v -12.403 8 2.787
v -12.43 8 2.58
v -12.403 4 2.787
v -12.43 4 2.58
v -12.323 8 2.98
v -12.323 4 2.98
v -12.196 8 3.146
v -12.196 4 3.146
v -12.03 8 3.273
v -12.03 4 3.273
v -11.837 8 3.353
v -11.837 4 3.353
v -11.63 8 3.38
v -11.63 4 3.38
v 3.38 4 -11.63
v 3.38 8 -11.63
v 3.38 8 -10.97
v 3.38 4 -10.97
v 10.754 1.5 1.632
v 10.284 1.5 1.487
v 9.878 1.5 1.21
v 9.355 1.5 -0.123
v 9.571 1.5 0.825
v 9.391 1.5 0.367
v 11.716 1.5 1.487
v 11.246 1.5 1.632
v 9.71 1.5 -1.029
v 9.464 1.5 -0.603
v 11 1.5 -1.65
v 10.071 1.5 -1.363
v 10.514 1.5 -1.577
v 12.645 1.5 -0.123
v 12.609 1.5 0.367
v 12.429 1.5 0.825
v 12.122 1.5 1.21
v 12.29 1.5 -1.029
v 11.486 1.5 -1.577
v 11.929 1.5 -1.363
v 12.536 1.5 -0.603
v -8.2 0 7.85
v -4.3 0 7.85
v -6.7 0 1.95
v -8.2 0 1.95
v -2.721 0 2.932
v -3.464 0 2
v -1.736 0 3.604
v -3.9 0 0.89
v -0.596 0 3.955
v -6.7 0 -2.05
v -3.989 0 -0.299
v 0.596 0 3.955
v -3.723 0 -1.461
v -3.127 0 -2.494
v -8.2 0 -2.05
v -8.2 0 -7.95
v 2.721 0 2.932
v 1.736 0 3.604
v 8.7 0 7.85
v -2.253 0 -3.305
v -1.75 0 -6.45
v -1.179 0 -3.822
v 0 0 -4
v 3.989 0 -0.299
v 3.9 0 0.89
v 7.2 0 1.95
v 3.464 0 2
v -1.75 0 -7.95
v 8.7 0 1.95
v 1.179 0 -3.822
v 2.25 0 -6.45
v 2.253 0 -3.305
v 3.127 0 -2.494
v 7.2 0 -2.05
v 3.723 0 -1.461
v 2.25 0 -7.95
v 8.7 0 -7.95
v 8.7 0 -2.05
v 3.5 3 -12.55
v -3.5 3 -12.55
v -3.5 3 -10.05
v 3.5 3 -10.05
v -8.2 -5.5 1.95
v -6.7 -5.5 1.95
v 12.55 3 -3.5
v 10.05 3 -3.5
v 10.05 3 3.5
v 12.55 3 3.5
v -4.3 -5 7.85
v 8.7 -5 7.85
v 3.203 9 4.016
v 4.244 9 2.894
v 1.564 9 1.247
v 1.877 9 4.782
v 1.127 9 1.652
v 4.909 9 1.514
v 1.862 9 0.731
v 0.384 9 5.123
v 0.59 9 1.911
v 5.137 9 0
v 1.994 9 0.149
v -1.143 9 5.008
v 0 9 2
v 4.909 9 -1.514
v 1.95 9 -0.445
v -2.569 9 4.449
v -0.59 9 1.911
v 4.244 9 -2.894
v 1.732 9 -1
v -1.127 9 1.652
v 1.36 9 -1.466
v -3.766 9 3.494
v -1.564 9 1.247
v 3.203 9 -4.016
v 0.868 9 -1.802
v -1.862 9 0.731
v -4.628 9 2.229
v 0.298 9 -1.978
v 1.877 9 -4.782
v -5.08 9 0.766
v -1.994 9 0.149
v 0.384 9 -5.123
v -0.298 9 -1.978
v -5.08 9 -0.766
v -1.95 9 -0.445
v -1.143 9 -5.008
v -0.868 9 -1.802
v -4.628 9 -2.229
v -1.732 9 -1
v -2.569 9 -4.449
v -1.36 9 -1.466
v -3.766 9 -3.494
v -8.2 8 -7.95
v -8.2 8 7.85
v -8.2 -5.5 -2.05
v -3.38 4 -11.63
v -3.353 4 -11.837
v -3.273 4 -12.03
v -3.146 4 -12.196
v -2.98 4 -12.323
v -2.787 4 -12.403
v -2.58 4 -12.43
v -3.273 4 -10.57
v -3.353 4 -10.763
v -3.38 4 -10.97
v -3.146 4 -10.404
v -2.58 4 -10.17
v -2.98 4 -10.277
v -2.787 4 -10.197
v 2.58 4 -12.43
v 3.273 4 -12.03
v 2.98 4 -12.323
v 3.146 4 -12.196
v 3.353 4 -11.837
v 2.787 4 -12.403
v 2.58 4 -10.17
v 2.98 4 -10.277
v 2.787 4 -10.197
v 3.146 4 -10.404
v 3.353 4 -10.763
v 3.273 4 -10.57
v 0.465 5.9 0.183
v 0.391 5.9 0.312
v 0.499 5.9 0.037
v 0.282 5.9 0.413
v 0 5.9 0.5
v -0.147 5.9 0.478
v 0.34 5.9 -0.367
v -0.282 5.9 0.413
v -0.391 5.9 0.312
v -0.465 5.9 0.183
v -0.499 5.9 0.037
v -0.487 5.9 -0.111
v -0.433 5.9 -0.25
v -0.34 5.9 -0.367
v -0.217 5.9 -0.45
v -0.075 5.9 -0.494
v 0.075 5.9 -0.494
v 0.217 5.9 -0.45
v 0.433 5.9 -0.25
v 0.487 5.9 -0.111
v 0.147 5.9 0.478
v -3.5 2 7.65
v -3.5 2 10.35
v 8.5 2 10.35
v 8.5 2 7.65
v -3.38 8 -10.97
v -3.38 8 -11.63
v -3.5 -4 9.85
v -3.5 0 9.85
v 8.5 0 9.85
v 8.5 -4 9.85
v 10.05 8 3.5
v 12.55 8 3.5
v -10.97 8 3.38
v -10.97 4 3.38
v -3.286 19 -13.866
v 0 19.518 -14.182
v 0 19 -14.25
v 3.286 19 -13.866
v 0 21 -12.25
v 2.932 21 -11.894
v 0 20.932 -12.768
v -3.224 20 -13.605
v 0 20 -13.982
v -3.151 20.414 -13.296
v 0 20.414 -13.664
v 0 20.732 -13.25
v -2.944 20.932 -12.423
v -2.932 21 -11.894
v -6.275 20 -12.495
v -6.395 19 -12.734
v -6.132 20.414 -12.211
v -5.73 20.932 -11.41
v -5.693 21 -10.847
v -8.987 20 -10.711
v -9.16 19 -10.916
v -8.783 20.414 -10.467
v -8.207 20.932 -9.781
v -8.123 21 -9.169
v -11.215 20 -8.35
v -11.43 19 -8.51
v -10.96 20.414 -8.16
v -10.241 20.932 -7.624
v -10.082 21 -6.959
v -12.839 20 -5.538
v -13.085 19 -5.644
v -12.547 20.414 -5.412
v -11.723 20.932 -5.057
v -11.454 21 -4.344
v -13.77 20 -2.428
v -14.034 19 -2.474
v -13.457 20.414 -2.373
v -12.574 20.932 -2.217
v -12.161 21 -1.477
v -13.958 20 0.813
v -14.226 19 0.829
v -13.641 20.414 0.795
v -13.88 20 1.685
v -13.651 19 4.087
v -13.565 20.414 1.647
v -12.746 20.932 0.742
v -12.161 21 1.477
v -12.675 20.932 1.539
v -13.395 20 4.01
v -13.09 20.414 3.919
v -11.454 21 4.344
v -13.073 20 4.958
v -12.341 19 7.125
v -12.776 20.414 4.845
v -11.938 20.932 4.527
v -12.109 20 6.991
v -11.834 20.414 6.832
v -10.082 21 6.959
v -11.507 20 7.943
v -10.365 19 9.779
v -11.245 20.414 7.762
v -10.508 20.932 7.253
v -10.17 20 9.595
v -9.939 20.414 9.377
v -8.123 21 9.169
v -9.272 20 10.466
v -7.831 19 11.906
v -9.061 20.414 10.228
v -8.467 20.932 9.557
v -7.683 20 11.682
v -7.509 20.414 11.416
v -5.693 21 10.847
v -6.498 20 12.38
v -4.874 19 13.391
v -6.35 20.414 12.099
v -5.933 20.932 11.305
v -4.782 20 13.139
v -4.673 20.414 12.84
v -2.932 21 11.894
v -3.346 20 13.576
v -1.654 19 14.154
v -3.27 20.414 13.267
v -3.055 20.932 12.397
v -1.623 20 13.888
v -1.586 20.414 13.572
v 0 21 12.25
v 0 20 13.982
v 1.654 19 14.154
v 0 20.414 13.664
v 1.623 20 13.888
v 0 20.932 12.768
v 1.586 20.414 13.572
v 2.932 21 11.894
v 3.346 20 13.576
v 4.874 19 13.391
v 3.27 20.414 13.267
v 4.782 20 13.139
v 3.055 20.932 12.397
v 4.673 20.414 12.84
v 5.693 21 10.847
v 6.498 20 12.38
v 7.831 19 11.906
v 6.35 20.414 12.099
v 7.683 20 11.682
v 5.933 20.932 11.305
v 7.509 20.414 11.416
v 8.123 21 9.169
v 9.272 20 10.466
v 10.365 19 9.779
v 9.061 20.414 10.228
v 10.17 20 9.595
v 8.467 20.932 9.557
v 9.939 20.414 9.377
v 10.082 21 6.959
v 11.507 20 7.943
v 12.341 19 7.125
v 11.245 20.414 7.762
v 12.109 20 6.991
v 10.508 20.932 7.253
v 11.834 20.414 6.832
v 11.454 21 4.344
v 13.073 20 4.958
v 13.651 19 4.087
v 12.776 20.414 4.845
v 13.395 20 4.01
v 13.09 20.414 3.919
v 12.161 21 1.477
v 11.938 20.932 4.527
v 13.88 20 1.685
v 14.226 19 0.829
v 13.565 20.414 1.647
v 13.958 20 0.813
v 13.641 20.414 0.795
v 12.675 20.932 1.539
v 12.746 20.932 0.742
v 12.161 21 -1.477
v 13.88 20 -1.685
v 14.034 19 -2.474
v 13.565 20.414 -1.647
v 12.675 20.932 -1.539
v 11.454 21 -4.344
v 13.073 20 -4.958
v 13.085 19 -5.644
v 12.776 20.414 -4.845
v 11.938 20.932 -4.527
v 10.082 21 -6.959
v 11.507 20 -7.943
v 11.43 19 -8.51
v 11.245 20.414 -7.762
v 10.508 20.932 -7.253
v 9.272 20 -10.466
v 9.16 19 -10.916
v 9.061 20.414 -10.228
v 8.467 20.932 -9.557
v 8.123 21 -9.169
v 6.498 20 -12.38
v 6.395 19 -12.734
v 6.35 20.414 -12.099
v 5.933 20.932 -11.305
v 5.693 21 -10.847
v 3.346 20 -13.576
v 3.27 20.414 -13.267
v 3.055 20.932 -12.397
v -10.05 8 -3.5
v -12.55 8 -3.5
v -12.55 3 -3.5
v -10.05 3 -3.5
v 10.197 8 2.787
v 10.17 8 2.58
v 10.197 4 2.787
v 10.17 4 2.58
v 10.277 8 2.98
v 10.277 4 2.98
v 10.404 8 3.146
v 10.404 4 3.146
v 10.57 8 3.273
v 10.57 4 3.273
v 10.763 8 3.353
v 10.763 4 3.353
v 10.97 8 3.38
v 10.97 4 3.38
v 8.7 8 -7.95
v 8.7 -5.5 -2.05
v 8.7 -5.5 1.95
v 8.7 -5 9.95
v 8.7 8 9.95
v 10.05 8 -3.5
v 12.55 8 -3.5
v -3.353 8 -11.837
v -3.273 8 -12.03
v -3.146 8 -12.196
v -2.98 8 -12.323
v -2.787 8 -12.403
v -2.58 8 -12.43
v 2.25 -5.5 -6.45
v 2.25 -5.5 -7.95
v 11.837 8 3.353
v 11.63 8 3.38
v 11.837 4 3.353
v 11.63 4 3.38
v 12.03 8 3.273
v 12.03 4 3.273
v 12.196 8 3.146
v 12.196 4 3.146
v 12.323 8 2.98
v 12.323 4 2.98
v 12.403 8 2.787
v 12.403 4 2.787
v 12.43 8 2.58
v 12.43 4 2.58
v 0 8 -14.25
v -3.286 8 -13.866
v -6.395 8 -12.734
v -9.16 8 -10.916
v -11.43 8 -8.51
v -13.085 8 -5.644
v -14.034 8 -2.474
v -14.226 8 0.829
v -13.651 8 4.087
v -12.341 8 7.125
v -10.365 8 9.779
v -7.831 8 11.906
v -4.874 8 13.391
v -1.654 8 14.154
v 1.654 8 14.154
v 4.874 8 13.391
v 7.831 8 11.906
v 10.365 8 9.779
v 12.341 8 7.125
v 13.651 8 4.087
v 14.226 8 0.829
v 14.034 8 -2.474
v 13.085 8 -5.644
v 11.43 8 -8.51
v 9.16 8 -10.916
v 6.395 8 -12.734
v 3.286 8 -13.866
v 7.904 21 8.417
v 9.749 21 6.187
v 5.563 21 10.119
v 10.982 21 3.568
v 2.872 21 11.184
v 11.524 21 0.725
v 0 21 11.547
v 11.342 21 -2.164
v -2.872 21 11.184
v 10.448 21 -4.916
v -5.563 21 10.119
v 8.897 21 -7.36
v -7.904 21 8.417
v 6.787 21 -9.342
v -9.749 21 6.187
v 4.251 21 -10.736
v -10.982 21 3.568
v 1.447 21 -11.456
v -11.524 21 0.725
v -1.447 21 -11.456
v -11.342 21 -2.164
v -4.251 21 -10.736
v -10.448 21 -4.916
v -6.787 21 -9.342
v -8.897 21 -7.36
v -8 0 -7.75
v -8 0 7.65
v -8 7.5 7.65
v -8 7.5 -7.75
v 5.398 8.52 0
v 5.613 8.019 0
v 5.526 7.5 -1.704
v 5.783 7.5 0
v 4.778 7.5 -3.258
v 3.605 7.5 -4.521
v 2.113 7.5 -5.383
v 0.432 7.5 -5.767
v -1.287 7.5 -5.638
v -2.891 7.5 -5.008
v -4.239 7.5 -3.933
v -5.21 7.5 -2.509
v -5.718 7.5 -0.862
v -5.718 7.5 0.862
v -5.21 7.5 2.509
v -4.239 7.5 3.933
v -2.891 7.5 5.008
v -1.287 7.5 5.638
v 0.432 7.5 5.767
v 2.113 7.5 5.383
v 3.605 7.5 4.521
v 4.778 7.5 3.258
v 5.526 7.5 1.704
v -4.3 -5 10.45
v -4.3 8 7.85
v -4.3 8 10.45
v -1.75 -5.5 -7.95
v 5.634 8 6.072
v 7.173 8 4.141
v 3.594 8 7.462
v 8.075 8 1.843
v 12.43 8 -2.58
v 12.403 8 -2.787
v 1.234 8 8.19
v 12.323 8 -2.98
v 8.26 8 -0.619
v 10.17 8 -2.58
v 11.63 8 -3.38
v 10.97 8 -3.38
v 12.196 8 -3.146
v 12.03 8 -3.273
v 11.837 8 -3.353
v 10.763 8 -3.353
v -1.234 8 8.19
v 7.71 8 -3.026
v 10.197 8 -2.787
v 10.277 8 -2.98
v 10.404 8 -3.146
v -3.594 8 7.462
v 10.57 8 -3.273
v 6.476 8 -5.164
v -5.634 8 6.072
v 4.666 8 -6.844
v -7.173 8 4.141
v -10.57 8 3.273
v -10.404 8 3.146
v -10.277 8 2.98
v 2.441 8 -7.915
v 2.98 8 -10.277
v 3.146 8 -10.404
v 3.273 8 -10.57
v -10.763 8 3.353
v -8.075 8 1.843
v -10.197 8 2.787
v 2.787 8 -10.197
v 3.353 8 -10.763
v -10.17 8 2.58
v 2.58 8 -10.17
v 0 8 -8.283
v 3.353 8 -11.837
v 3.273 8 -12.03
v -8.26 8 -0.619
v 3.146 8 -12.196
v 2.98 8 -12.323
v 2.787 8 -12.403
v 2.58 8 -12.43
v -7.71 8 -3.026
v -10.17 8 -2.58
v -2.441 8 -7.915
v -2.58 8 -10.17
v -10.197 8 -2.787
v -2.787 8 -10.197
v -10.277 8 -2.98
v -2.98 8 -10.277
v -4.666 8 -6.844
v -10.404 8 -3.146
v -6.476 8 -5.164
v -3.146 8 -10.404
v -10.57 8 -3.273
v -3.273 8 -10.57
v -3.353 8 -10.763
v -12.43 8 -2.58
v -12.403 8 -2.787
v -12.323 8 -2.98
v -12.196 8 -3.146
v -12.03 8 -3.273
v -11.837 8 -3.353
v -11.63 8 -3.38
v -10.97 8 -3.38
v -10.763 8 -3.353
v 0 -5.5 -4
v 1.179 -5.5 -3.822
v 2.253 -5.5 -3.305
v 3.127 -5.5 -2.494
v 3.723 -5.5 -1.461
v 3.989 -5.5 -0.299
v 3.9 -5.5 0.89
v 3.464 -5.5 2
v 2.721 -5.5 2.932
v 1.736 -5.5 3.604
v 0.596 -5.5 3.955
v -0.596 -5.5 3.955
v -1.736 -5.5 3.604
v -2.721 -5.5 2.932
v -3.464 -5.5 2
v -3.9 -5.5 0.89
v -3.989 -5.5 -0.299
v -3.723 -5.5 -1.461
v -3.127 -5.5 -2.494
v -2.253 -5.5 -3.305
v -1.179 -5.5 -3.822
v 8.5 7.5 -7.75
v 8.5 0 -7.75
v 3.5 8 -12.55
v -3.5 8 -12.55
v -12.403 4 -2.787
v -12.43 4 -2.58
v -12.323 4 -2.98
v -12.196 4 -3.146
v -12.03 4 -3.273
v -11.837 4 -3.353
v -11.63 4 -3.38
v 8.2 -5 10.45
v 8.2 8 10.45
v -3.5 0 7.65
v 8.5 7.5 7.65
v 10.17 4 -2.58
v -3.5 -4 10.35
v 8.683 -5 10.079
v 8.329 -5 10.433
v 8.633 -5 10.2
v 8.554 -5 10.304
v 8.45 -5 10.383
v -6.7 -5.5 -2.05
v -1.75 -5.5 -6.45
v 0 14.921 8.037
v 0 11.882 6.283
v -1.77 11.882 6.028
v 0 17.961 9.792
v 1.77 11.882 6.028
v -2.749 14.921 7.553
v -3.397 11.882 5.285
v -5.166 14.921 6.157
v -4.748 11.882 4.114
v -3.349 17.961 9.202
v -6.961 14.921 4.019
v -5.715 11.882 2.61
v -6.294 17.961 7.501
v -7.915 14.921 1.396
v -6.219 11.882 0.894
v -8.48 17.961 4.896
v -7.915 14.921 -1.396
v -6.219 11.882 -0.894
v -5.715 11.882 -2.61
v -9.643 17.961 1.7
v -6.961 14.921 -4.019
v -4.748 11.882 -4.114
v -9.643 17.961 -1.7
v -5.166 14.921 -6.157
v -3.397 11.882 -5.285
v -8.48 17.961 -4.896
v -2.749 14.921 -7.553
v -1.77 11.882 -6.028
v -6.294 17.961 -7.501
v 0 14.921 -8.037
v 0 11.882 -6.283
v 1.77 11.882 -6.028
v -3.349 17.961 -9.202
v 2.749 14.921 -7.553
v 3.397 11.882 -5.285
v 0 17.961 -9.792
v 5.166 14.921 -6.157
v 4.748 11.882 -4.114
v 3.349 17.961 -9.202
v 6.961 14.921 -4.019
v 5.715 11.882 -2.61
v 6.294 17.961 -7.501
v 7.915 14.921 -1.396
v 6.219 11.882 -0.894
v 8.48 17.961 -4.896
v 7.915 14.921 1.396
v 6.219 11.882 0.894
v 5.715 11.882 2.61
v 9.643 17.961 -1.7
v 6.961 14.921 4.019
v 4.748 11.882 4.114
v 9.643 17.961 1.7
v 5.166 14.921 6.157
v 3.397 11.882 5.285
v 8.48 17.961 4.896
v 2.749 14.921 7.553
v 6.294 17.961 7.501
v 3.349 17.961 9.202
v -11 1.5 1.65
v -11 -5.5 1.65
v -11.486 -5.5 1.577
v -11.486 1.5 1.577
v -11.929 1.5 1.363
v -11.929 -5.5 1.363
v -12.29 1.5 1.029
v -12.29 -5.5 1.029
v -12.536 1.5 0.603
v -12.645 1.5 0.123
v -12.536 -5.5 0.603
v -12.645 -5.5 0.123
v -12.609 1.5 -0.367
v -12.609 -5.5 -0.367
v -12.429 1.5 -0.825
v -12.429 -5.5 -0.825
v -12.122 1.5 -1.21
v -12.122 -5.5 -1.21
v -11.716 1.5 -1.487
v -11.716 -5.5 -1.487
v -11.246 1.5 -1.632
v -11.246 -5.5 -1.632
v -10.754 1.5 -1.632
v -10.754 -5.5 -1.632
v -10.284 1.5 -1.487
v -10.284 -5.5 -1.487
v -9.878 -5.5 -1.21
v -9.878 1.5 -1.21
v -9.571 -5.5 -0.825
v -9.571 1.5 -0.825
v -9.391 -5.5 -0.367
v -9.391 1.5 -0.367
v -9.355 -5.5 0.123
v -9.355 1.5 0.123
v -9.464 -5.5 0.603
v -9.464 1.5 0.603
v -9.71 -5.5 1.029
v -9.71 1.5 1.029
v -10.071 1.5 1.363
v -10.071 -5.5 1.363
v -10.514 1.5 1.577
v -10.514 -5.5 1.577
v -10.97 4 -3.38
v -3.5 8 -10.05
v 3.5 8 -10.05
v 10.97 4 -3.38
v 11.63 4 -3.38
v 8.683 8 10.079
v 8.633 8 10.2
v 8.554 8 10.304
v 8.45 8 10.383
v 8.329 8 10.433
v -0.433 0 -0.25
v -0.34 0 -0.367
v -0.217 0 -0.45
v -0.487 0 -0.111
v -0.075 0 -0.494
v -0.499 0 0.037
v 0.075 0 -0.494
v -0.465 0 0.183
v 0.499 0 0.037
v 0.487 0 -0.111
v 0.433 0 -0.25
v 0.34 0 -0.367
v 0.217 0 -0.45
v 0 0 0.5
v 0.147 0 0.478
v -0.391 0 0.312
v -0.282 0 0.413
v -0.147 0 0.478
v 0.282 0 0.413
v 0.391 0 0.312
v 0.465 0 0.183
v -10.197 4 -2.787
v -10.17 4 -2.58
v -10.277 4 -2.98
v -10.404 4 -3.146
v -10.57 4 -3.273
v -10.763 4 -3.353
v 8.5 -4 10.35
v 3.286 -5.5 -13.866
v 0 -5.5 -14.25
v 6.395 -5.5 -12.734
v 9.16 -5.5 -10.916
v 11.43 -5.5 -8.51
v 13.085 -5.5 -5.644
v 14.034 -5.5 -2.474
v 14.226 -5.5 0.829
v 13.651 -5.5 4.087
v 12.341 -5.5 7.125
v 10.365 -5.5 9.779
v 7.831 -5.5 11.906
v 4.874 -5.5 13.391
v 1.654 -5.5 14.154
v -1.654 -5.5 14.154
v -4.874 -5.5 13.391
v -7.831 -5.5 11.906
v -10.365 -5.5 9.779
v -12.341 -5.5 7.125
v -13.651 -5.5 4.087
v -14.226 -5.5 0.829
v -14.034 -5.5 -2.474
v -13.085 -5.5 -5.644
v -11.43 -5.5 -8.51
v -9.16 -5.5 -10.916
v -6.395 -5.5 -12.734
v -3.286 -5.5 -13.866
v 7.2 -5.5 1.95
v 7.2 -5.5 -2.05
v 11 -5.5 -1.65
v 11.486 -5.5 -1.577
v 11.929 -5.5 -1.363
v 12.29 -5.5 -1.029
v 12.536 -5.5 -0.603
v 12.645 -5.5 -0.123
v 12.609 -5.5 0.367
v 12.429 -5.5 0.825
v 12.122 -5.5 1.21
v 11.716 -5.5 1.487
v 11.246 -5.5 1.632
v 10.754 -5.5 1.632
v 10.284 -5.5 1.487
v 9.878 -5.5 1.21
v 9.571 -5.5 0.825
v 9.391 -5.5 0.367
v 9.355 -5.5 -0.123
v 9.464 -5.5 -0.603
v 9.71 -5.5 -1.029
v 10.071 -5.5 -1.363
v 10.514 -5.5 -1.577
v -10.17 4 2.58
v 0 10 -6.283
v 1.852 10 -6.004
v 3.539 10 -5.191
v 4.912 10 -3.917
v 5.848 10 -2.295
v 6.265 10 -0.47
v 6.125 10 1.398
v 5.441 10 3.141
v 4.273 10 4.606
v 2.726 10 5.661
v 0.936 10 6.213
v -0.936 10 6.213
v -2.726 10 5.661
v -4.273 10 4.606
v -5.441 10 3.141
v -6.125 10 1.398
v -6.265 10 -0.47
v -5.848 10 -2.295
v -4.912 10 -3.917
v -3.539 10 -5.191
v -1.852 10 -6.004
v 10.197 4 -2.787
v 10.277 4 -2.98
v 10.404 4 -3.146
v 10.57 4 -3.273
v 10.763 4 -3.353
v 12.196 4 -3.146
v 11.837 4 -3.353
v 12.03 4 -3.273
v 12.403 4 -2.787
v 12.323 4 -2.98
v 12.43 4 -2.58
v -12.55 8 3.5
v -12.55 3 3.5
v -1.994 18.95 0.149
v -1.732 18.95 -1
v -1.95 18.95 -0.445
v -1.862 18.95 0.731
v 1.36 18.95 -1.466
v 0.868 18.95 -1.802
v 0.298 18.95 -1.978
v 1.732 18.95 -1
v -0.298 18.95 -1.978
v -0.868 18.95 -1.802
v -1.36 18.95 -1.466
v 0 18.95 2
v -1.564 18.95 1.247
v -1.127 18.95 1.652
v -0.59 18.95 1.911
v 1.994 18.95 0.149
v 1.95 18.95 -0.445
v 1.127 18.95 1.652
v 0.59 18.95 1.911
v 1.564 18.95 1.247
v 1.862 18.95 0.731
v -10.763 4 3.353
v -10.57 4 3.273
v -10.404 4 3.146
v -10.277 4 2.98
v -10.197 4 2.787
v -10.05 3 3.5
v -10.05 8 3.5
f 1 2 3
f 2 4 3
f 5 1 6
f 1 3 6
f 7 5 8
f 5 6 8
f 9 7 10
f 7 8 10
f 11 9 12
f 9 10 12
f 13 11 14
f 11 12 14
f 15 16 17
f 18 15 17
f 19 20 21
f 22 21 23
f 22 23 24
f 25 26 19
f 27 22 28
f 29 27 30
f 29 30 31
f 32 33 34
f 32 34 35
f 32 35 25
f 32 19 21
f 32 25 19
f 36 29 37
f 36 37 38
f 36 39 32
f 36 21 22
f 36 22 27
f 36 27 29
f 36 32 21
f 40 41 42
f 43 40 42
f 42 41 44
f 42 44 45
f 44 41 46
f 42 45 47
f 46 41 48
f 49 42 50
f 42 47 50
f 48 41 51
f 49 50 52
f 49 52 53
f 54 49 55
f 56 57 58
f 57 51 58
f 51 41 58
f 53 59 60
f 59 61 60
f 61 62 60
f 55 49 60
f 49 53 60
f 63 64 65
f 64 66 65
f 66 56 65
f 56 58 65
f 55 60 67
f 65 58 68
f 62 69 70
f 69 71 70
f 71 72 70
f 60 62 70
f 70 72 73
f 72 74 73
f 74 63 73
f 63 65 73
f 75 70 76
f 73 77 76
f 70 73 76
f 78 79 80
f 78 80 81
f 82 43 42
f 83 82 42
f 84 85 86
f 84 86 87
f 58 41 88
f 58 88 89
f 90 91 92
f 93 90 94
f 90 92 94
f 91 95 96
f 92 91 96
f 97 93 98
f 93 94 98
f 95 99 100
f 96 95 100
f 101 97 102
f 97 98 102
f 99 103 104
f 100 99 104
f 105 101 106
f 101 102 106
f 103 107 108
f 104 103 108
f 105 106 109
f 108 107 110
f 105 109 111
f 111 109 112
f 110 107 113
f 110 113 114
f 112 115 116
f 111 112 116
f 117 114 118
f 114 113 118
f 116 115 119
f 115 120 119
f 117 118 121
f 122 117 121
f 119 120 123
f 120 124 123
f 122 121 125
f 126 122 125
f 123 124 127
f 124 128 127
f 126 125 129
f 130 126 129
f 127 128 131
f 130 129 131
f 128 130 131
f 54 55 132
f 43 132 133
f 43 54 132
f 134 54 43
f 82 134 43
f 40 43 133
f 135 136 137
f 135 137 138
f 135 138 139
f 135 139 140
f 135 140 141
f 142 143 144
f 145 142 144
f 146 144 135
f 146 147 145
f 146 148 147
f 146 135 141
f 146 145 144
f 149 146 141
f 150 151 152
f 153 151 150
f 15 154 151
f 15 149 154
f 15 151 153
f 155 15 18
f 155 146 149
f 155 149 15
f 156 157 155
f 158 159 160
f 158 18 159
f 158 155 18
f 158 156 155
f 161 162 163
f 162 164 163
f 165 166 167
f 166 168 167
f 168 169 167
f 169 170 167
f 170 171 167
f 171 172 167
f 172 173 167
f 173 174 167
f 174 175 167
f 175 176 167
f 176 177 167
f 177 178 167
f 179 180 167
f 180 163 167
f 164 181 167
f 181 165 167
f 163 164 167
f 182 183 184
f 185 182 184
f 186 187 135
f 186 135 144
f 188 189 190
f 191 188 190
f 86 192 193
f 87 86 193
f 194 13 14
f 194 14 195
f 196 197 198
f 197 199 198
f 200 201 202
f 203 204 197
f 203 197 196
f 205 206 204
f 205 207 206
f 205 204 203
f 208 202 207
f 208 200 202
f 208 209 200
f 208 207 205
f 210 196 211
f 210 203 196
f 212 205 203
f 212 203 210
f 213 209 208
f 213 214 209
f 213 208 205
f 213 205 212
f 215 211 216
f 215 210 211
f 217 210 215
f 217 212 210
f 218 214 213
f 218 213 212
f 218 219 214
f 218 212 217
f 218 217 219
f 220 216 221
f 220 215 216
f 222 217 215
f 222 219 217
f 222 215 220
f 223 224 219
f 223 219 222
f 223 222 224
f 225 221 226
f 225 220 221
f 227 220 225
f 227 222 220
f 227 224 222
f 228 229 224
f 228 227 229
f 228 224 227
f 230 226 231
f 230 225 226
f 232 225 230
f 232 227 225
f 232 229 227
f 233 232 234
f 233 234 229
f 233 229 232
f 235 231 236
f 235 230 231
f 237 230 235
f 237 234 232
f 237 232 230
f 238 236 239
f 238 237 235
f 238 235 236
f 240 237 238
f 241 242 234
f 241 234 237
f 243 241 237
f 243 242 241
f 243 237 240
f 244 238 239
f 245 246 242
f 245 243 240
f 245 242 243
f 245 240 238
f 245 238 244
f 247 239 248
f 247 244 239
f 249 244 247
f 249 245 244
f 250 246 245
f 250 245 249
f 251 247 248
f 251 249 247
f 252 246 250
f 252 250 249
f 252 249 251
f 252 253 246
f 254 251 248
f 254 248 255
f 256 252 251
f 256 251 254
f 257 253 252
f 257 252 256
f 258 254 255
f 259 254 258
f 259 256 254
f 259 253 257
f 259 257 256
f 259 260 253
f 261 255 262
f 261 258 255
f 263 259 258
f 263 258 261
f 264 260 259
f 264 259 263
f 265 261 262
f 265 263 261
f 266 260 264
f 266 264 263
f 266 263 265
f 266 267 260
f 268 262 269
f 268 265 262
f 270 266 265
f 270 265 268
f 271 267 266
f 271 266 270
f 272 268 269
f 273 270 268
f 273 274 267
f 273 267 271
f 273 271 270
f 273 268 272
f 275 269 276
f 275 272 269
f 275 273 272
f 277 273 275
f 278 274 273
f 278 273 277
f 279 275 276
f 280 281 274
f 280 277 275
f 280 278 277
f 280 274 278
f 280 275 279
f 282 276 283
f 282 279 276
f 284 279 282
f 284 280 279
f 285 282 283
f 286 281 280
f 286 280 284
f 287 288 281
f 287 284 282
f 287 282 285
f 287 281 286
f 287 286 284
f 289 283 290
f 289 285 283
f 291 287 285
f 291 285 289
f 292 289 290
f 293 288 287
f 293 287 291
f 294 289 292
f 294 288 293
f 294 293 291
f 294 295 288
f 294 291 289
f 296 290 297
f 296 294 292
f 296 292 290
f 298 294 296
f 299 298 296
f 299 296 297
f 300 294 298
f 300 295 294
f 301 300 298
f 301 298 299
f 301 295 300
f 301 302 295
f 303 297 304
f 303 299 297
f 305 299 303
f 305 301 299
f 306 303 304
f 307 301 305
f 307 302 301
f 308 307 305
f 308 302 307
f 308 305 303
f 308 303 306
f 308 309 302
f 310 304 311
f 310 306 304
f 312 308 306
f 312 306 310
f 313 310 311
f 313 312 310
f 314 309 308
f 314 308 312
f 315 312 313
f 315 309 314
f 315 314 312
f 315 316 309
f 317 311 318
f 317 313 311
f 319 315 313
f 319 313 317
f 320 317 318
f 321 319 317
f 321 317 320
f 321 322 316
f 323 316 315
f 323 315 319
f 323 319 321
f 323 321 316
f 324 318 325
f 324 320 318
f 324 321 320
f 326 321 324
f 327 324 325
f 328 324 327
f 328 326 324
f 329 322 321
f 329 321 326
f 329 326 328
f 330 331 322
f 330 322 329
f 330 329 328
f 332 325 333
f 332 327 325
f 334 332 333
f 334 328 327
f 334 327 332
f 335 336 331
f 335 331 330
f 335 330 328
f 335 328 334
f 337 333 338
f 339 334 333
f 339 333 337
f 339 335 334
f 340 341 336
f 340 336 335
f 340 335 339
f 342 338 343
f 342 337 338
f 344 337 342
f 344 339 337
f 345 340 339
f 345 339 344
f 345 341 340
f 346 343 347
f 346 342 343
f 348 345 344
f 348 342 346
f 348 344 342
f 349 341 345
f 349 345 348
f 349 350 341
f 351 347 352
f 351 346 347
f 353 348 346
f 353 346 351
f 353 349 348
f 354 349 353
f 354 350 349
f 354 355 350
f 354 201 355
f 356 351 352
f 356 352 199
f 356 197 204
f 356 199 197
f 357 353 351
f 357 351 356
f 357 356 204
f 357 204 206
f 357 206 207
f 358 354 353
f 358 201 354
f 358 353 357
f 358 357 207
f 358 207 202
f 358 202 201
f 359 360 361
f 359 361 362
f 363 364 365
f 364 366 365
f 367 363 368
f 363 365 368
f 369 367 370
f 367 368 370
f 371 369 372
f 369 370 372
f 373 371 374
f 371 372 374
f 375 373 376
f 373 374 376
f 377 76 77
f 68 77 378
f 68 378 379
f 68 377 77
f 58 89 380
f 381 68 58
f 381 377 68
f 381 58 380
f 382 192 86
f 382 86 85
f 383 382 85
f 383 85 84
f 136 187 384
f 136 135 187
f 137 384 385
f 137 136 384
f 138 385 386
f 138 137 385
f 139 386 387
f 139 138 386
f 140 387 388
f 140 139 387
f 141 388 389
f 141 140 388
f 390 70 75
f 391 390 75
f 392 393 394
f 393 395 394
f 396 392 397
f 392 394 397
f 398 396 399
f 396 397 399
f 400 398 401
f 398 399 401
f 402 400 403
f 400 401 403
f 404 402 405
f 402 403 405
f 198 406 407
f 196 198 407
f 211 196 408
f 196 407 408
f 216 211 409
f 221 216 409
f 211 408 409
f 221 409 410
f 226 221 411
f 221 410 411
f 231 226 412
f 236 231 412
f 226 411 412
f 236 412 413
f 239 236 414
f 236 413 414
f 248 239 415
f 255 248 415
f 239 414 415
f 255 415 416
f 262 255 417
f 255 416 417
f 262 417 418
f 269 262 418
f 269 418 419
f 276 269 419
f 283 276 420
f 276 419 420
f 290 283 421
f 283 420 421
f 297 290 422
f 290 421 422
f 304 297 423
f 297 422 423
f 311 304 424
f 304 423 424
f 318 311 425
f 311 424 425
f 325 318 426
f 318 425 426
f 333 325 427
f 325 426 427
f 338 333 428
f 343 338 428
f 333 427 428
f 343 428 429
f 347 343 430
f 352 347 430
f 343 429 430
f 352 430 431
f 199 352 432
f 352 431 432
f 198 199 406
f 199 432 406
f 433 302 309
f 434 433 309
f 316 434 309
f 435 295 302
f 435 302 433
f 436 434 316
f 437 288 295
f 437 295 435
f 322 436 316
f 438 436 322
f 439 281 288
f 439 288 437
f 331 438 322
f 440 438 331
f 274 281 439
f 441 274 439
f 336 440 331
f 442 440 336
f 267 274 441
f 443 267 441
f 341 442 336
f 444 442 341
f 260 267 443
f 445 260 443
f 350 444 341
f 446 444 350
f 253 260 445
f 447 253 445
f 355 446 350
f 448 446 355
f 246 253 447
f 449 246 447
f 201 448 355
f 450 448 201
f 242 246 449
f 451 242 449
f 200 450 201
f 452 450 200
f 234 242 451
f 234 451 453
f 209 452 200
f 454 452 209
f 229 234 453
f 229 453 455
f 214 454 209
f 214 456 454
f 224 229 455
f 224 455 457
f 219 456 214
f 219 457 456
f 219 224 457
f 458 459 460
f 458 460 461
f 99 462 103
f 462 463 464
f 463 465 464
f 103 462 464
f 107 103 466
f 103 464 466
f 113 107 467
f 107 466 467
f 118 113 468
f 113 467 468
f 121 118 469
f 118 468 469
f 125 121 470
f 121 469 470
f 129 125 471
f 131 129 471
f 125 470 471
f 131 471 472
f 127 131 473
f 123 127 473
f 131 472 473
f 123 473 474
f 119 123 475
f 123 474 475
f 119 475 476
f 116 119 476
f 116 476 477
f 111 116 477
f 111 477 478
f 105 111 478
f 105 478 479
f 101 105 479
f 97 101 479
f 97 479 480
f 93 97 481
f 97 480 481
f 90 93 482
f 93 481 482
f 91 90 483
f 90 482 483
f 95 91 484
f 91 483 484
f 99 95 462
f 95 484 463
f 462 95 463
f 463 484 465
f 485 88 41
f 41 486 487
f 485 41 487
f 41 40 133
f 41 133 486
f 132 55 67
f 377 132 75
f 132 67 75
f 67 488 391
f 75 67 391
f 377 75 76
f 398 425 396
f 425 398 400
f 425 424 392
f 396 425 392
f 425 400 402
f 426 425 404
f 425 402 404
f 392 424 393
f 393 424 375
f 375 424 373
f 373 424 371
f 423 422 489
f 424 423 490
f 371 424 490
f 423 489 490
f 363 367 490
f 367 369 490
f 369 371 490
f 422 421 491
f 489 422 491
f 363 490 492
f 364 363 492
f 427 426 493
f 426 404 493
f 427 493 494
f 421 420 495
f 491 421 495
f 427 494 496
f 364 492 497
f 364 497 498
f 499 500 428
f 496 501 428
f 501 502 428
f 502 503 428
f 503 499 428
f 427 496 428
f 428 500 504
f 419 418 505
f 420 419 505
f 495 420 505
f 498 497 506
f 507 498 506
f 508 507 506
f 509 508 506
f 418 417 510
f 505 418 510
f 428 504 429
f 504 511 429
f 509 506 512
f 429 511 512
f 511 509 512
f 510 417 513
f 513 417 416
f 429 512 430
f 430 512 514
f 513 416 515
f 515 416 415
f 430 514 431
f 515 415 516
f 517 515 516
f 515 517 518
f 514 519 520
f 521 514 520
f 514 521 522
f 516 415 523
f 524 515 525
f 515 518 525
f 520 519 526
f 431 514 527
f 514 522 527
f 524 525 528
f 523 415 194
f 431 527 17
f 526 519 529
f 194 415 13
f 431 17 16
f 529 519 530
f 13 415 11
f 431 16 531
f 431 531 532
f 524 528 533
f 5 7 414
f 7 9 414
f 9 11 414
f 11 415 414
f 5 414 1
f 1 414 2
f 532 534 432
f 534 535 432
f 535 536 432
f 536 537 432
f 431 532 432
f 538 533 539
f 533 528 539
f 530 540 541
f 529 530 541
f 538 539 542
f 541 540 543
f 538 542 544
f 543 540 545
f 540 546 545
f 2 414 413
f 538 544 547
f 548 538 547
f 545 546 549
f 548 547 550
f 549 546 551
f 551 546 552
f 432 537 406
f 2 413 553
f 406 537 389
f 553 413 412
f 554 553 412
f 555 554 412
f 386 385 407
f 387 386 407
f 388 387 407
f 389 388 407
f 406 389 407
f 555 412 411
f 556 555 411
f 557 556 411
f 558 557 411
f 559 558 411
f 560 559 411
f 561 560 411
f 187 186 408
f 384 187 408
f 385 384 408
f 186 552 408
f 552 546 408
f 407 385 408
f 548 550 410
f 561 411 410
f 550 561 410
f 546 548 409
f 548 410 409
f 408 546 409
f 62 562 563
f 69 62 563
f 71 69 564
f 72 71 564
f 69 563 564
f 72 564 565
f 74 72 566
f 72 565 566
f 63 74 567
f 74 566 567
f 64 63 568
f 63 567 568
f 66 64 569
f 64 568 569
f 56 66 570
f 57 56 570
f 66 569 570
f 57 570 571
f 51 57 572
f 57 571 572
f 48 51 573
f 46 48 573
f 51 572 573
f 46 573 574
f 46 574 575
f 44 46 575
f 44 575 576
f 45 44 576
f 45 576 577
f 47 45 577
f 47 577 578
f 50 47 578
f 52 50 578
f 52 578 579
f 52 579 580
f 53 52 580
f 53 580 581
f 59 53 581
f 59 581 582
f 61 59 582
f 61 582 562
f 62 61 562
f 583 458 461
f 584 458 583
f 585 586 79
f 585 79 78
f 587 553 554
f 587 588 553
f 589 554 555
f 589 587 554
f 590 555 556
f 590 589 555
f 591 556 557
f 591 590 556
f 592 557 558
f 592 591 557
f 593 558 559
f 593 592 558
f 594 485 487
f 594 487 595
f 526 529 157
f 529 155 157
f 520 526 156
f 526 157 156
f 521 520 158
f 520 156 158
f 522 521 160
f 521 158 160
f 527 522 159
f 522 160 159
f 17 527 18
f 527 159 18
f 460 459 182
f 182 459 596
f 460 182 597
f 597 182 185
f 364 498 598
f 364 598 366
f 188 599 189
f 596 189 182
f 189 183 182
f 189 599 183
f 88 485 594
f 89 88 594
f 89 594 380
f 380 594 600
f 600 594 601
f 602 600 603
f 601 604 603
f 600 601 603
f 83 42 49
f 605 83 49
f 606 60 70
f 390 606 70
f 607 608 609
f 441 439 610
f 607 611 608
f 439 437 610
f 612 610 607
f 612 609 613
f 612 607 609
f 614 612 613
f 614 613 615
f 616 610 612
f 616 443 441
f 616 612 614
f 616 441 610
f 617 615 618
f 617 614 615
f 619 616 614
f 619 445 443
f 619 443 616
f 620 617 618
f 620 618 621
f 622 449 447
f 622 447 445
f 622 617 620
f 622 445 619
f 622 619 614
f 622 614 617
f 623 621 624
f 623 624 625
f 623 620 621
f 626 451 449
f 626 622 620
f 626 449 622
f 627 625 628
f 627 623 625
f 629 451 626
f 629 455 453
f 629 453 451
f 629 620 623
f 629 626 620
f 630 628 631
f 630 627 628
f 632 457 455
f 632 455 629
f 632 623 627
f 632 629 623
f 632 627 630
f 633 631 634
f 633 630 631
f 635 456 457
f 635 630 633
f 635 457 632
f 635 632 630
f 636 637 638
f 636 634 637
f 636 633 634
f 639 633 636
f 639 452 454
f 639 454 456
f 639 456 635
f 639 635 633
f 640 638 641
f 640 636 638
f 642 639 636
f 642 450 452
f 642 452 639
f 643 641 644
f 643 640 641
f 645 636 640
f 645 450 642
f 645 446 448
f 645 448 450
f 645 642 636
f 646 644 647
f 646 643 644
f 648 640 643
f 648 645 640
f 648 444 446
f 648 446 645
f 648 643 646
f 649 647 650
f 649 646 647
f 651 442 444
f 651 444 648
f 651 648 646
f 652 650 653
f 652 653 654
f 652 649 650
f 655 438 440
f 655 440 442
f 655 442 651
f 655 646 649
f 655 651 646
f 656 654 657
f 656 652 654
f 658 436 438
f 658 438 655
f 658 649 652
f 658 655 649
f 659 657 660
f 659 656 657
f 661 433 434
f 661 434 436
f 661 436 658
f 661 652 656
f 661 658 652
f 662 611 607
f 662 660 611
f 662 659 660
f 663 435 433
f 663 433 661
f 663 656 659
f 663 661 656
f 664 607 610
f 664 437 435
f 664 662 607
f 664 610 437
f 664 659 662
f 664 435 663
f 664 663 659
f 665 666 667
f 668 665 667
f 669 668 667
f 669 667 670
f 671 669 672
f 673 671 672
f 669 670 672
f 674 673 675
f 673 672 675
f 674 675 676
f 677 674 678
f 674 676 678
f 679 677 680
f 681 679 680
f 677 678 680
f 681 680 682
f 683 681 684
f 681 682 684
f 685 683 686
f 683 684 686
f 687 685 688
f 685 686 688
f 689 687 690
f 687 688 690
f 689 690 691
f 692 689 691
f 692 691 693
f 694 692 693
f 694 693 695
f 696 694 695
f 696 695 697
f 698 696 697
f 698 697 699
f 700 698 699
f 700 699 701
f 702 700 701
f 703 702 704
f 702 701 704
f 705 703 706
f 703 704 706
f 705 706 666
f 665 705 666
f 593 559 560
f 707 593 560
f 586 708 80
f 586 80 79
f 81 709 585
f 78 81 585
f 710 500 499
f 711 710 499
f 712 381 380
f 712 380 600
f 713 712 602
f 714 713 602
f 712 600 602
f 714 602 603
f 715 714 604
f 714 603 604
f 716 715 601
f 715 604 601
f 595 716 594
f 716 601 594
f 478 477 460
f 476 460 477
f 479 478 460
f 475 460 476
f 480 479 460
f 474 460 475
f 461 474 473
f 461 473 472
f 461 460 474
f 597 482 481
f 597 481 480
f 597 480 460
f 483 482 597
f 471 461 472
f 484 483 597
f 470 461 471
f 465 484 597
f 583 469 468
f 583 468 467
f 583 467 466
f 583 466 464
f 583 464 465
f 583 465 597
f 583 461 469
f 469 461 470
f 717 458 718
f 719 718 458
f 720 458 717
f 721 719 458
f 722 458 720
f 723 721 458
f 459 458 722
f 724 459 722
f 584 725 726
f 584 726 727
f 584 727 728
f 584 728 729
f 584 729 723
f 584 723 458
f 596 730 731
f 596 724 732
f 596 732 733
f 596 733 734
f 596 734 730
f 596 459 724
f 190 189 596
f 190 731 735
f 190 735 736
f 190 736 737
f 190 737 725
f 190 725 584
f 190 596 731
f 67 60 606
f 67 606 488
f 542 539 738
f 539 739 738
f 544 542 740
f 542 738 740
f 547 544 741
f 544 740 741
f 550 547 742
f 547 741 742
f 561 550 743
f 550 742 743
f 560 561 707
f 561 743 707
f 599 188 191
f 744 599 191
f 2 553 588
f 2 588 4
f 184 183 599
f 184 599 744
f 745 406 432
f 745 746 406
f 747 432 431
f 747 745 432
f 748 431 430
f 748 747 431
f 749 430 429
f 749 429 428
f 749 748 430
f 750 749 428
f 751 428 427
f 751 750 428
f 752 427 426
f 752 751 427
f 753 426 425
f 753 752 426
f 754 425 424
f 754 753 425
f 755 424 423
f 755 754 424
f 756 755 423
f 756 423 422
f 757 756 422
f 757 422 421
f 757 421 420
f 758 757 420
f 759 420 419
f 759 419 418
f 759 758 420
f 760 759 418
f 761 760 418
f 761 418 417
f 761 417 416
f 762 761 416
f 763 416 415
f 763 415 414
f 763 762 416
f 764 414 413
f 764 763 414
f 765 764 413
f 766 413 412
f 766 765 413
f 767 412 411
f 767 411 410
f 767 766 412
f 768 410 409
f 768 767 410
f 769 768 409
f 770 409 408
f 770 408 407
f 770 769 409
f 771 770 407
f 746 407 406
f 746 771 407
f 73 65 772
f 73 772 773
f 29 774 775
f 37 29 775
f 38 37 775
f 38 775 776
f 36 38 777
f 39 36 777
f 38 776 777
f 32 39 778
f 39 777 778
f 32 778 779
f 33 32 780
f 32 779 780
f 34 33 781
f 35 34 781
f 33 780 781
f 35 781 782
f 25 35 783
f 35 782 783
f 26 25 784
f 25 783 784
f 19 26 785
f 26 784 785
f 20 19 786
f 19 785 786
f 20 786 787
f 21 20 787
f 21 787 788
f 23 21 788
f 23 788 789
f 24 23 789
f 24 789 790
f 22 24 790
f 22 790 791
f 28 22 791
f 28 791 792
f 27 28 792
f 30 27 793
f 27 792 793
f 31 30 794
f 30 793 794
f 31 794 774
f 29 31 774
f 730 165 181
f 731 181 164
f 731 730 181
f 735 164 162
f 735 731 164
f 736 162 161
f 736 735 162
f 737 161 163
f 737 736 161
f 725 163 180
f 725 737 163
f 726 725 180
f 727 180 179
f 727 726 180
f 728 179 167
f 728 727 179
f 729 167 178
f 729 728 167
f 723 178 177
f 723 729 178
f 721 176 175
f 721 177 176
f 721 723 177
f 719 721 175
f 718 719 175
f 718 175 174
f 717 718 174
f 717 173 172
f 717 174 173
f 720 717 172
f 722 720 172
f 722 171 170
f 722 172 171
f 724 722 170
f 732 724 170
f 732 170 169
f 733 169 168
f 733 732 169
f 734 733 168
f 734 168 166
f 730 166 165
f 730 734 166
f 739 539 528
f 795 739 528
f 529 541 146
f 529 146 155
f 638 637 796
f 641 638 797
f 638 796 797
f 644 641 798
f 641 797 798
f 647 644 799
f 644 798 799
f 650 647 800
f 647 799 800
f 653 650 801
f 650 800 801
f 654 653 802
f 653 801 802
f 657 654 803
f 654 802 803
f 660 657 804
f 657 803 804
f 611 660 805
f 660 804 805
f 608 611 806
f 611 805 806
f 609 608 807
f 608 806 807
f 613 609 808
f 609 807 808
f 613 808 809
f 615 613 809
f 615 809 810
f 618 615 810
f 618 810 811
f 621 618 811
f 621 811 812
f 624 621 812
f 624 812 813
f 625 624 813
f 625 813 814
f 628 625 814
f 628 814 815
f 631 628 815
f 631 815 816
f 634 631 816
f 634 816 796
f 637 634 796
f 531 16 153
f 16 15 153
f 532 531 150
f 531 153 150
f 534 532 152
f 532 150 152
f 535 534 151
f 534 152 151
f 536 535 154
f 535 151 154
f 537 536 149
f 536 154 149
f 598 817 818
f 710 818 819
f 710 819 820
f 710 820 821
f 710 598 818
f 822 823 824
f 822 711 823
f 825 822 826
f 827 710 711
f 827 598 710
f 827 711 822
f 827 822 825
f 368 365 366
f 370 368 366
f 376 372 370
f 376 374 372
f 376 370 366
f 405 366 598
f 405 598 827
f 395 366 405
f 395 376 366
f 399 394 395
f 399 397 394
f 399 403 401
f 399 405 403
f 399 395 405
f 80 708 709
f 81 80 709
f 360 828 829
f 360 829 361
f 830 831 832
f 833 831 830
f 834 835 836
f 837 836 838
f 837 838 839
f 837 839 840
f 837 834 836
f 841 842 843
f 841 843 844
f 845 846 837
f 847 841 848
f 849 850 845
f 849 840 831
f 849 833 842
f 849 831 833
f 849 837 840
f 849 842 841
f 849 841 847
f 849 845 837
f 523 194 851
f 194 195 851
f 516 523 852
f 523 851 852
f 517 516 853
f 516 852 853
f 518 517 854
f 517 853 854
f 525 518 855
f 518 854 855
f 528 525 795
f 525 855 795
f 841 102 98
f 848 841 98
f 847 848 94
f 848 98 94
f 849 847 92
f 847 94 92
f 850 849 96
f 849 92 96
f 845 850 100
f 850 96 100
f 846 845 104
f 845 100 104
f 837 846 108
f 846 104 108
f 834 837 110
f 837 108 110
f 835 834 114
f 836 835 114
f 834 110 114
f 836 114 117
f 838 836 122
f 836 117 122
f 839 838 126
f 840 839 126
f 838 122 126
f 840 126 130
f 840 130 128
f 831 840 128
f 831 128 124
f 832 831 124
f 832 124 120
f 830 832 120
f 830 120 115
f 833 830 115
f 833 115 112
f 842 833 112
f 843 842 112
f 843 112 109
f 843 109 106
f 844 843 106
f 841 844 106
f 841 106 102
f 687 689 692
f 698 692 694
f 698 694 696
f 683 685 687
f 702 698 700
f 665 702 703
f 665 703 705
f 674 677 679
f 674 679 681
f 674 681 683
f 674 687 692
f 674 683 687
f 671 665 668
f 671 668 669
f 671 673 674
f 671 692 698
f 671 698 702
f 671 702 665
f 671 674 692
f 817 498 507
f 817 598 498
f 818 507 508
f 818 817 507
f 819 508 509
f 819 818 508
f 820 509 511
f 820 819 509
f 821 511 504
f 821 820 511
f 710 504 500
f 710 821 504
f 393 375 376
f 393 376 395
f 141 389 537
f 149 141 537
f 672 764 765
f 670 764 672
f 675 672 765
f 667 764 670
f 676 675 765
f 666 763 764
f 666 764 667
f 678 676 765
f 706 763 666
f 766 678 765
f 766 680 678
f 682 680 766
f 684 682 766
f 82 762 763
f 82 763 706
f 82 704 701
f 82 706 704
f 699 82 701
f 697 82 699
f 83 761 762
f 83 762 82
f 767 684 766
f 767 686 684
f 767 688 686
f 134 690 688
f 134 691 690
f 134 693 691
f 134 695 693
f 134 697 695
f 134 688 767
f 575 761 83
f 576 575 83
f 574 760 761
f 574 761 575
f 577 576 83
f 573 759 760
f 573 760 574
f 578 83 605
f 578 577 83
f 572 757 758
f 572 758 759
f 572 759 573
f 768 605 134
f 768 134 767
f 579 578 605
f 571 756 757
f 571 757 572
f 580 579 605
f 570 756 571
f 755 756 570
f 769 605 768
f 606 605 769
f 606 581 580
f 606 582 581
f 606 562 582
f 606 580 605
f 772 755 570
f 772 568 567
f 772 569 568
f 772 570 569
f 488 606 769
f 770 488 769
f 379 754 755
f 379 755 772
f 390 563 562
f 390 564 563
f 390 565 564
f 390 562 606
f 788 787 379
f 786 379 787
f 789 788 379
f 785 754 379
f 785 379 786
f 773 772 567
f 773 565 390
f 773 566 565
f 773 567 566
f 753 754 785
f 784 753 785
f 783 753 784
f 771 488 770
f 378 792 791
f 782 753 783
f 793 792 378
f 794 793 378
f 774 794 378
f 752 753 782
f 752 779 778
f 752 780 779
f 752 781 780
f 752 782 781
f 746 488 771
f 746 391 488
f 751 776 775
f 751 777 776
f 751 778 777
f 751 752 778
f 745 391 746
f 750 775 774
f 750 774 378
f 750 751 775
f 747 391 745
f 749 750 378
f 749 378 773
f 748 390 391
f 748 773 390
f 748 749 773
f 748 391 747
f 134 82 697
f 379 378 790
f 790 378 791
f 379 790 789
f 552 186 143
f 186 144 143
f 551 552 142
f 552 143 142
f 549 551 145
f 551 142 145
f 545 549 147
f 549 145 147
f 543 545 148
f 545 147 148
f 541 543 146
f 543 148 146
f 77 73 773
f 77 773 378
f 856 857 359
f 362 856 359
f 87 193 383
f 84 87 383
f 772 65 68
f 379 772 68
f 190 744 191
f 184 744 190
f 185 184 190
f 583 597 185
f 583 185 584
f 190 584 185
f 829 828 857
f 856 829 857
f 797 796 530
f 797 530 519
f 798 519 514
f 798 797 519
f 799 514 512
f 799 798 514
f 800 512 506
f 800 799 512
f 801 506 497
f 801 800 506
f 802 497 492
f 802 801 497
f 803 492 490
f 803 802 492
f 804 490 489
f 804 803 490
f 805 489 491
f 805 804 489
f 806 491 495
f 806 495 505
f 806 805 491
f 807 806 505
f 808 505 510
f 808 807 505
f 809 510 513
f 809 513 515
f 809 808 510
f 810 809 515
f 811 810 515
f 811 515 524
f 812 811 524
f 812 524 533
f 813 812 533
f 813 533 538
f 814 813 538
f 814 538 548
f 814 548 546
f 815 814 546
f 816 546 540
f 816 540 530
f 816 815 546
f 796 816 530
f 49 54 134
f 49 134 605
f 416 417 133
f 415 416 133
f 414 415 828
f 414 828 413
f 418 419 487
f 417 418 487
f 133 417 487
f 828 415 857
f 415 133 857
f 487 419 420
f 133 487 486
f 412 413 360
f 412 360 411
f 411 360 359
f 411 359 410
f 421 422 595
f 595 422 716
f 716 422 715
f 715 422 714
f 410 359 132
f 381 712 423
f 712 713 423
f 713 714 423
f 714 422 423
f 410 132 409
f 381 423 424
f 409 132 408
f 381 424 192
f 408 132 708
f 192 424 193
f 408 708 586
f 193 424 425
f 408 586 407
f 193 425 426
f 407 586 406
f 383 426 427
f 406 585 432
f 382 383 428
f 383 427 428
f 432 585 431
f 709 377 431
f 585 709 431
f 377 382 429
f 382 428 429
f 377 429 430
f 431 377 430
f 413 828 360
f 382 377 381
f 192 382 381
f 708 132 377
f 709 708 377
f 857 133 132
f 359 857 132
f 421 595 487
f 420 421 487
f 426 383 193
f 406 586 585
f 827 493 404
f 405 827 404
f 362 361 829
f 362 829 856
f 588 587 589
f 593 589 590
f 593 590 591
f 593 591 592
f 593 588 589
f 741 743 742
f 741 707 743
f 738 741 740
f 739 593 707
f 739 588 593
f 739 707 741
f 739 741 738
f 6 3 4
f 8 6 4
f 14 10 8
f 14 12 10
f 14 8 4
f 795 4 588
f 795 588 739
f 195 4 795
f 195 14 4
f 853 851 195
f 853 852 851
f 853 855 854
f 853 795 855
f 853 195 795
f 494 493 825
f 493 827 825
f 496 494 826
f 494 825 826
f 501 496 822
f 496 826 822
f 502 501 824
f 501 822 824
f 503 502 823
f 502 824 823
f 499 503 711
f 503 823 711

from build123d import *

# Parameters (mm, degrees)
SKETCH_1_W          = 16.5
SKETCH_1_H          = 15.4
SKETCH_1_R          = 0.5
EXTRUDE_1_DEPTH     = 7.5
SKETCH_2_W          = 12
SKETCH_2_H          = 2.7
EXTRUDE_2_DEPTH     = 2
SKETCH_3_W          = 12
SKETCH_3_H          = 0.5
EXTRUDE_3_DEPTH     = 6
SKETCH_4_R          = 2
EXTRUDE_4_DEPTH     = 11.45
SKETCH_6_R          = 14.25
SKETCH_6_W          = 16.9
SKETCH_6_H          = 15.8
EXTRUDE_5_DEPTH     = 8
SKETCH_8_R          = 14.25
EXTRUDE_6_DEPTH     = 5.5
SKETCH_7_W          = 13
SKETCH_7_H          = 2.6
CUT_EXTRUDE_2_DEPTH = 13
FILLET_1_R          = 0.5
SKETCH_9_R          = 1.65
CUT_EXTRUDE_3_DEPTH = 7
SKETCH_11_W         = 2.5
SKETCH_11_H         = 7
SKETCH_11_W_2       = 7
SKETCH_11_H_2       = 2.5
CUT_EXTRUDE_4_DEPTH = 5
SKETCH_12_W         = 1.5
SKETCH_12_H         = 4
SKETCH_12_W_2       = 4
SKETCH_12_H_2       = 1.5
CUT_EXTRUDE_5_DEPTH = 7
SKETCH_13_R         = 14.25
EXTRUDE_8_DEPTH     = 13
SKETCH_15_R         = 6.282732918
CUT_EXTRUDE_6_DEPTH = 15
FILLET_2_R          = 2
SKETCH_16_W         = 2.26
SKETCH_16_H         = 6.76
SKETCH_16_W_2       = 6.76
SKETCH_16_H_2       = 2.26
EXTRUDE_9_DEPTH     = 4
FILLET_3_R          = 0.8
SKETCH_17_R         = 4
CUT_EXTRUDE_7_DEPTH = 13.5
CHAMFER_1_SIZE      = 2


with BuildPart() as part:
    # 草图1 → 凸台-拉伸1 (new body)
    with BuildSketch(Plane(origin=(0, 0, 0), x_dir=(1, 0, 0), z_dir=(0, 1, 0))):
        with Locations((0.25, 0.05)):
            Rectangle(SKETCH_1_W, SKETCH_1_H)
        with Locations(Location((0, 0, 0), (0, 0, 270))):
            Circle(SKETCH_1_R, mode=Mode.SUBTRACT)
    extrude(amount=EXTRUDE_1_DEPTH)

    # 草图2 → 凸台-拉伸2 (add)
    with BuildSketch(Plane.XZ):
        with Locations((2.5, 9)):
            Rectangle(SKETCH_2_W, SKETCH_2_H)
    extrude(amount=-EXTRUDE_2_DEPTH)

    # 草图3 → 凸台-拉伸3 (add)
    with BuildSketch(Plane(origin=(0, 2, 0), x_dir=(1, 0, 0), z_dir=(0, 1, 0))):
        with Locations((2.5, -10.1)):
            Rectangle(SKETCH_3_W, SKETCH_3_H)
    extrude(amount=-EXTRUDE_3_DEPTH)

    # 草图4 → 凸台-拉伸4 (add)
    with BuildSketch(Plane(origin=(0, 7.5, 0), x_dir=(1, 0, 0), z_dir=(0, 1, 0))):
        with Locations(Location((0, 0, 0), (0, 0, 270))):
            Circle(SKETCH_4_R)
    extrude(amount=EXTRUDE_4_DEPTH)

    # 草图5 → 旋转1 (revolve)
    with BuildSketch(Plane.XY):
        with BuildLine():
            Line((0, 9), (5.137119816, 9))
            ThreePointArc((5.137119816, 9), (5.780256002, 7.508925279), (6, 5.9))
            Line((6, 5.9), (0, 5.9))
            Line((0, 5.9), (0, 9))
        make_face()
    revolve(axis=Axis((0, 0, 0), (0, 1, 0)))


with BuildPart() as body_2:
    # 草图6 → 凸台-拉伸5 (new body)
    with BuildSketch(Plane.XZ):
        with Locations(Location((0, 0, 0), (0, 0, 270))):
            Circle(SKETCH_6_R)
        with Locations((0.25, -0.05)):
            Rectangle(SKETCH_6_W, SKETCH_6_H, mode=Mode.SUBTRACT)
    extrude(amount=-EXTRUDE_5_DEPTH)

    # 草图8 → 凸台-拉伸6 (add)
    with BuildSketch(Plane.XZ):
        with Locations(Location((0, 0, 0), (0, 0, 270))):
            Circle(SKETCH_8_R)
    extrude(amount=EXTRUDE_6_DEPTH)

    # 草图7 → 切除-拉伸2 (cut)
    with BuildSketch(Plane.XZ.offset(-8)):
        with Locations((2.2, 9.15)):
            Rectangle(SKETCH_7_W, SKETCH_7_H)
    extrude(amount=CUT_EXTRUDE_2_DEPTH, mode=Mode.SUBTRACT)

    # 圆角1
    fillet_1_edges = [body_2.edges().sort_by_distance(p)[0] for p in [
        (8.7, 1.5, 10.45),
    ]]
    fillet(fillet_1_edges, radius=FILLET_1_R)

    # 草图9 → 切除-拉伸3 (cut)
    with BuildSketch(Plane.XZ.offset(5.5)):
        with Locations(Location((11, 0, 0), (0, 0, 270))):
            Circle(SKETCH_9_R)
        with Locations(Location((-11, 0, 0), (0, 0, 90))):
            Circle(SKETCH_9_R)
    extrude(amount=-CUT_EXTRUDE_3_DEPTH, mode=Mode.SUBTRACT)

    # 草图11 → 切除-拉伸4 (cut)
    with BuildSketch(Plane(origin=(0, 8, 0), x_dir=(1, 0, 0), z_dir=(0, 1, 0))):
        with Locations((-11.3, 0)):
            Rectangle(SKETCH_11_W, SKETCH_11_H)
        with Locations((11.3, 0)):
            Rectangle(SKETCH_11_W, SKETCH_11_H)
        with Locations((0, 11.3)):
            Rectangle(SKETCH_11_W_2, SKETCH_11_H_2)
    extrude(amount=-CUT_EXTRUDE_4_DEPTH, mode=Mode.SUBTRACT)

    # 草图12 → 切除-拉伸5 (cut)
    with BuildSketch(Plane(origin=(0, 0, 0), x_dir=(1, 0, 0), z_dir=(0, 1, 0))):
        with Locations((7.95, 0.05)):
            Rectangle(SKETCH_12_W, SKETCH_12_H)
        with Locations((0.25, 7.2)):
            Rectangle(SKETCH_12_W_2, SKETCH_12_H_2)
        with Locations((-7.45, 0.05)):
            Rectangle(SKETCH_12_W, SKETCH_12_H)
    extrude(amount=-CUT_EXTRUDE_5_DEPTH, mode=Mode.SUBTRACT)

    # 草图17 → 切除-拉伸7 (cut)
    with BuildSketch(Plane.XZ.offset(5.5)):
        with Locations(Location((0, 0, 0), (0, 0, 270))):
            Circle(SKETCH_17_R)
    extrude(amount=-CUT_EXTRUDE_7_DEPTH, mode=Mode.SUBTRACT)


with BuildPart() as body_3:
    # 草图13 → 凸台-拉伸8 (new body)
    with BuildSketch(Plane(origin=(0, 8, 0), x_dir=(1, 0, 0), z_dir=(0, 1, 0))):
        with Locations(Location((0, 0, 0), (0, 0, 90))):
            Circle(SKETCH_13_R)
    extrude(amount=EXTRUDE_8_DEPTH)

    # 草图14 → 切除-旋转1 (revolve, cut)
    with BuildSketch(Plane.XY, mode=Mode.PRIVATE) as cut_revolve_1_sk:
        Polygon((0, 1), (13.735073412, 24.789844995), (0, 24.789844995), align=None)
    revolve(cut_revolve_1_sk.sketch.rotate(Axis((0, 24.789844995, 0), (0, -1, 0)), 90), axis=Axis((0, 24.789844995, 0), (0, -1, 0)), mode=Mode.SUBTRACT)

    # 草图15 → 切除-拉伸6 (cut)
    with BuildSketch(Plane.XZ.offset(-8)):
        with Locations(Location((0, 0, 0), (0, 0, 270))):
            Circle(SKETCH_15_R)
    extrude(amount=-CUT_EXTRUDE_6_DEPTH, mode=Mode.SUBTRACT)

    # 圆角2
    fillet_2_edges = [body_3.edges().sort_by_distance(p)[0] for p in [
        (0, 21, 14.25),
    ]]
    fillet(fillet_2_edges, radius=FILLET_2_R)

    # 草图16 → 凸台-拉伸9 (add)
    with BuildSketch(Plane.XZ.offset(-8)):
        with Locations((-11.3, 0)):
            Rectangle(SKETCH_16_W, SKETCH_16_H)
        with Locations((11.3, 0)):
            Rectangle(SKETCH_16_W, SKETCH_16_H)
        with Locations((0, -11.3)):
            Rectangle(SKETCH_16_W_2, SKETCH_16_H_2)
    extrude(amount=EXTRUDE_9_DEPTH)

    # 圆角3
    fillet_3_edges = [body_3.edges().sort_by_distance(p)[0] for p in [
        (-10.17, 6, -3.38),
        (-10.17, 6, 3.38),
        (-12.43, 6, 3.38),
        (-12.43, 6, -3.38),
        (10.17, 6, -3.38),
        (12.43, 6, -3.38),
        (12.43, 6, 3.38),
        (10.17, 6, 3.38),
        (-3.38, 6, -12.43),
        (3.38, 6, -12.43),
        (3.38, 6, -10.17),
        (-3.38, 6, -10.17),
    ]]
    fillet(fillet_3_edges, radius=FILLET_3_R)

    # 倒角1
    chamfer_1_edges = [body_3.edges().sort_by_distance(p)[0] for p in [
        (0, 8, 6.282732918),
    ]]
    chamfer(chamfer_1_edges, length=CHAMFER_1_SIZE)


solid = Compound([part.part, body_2.part, body_3.part])
